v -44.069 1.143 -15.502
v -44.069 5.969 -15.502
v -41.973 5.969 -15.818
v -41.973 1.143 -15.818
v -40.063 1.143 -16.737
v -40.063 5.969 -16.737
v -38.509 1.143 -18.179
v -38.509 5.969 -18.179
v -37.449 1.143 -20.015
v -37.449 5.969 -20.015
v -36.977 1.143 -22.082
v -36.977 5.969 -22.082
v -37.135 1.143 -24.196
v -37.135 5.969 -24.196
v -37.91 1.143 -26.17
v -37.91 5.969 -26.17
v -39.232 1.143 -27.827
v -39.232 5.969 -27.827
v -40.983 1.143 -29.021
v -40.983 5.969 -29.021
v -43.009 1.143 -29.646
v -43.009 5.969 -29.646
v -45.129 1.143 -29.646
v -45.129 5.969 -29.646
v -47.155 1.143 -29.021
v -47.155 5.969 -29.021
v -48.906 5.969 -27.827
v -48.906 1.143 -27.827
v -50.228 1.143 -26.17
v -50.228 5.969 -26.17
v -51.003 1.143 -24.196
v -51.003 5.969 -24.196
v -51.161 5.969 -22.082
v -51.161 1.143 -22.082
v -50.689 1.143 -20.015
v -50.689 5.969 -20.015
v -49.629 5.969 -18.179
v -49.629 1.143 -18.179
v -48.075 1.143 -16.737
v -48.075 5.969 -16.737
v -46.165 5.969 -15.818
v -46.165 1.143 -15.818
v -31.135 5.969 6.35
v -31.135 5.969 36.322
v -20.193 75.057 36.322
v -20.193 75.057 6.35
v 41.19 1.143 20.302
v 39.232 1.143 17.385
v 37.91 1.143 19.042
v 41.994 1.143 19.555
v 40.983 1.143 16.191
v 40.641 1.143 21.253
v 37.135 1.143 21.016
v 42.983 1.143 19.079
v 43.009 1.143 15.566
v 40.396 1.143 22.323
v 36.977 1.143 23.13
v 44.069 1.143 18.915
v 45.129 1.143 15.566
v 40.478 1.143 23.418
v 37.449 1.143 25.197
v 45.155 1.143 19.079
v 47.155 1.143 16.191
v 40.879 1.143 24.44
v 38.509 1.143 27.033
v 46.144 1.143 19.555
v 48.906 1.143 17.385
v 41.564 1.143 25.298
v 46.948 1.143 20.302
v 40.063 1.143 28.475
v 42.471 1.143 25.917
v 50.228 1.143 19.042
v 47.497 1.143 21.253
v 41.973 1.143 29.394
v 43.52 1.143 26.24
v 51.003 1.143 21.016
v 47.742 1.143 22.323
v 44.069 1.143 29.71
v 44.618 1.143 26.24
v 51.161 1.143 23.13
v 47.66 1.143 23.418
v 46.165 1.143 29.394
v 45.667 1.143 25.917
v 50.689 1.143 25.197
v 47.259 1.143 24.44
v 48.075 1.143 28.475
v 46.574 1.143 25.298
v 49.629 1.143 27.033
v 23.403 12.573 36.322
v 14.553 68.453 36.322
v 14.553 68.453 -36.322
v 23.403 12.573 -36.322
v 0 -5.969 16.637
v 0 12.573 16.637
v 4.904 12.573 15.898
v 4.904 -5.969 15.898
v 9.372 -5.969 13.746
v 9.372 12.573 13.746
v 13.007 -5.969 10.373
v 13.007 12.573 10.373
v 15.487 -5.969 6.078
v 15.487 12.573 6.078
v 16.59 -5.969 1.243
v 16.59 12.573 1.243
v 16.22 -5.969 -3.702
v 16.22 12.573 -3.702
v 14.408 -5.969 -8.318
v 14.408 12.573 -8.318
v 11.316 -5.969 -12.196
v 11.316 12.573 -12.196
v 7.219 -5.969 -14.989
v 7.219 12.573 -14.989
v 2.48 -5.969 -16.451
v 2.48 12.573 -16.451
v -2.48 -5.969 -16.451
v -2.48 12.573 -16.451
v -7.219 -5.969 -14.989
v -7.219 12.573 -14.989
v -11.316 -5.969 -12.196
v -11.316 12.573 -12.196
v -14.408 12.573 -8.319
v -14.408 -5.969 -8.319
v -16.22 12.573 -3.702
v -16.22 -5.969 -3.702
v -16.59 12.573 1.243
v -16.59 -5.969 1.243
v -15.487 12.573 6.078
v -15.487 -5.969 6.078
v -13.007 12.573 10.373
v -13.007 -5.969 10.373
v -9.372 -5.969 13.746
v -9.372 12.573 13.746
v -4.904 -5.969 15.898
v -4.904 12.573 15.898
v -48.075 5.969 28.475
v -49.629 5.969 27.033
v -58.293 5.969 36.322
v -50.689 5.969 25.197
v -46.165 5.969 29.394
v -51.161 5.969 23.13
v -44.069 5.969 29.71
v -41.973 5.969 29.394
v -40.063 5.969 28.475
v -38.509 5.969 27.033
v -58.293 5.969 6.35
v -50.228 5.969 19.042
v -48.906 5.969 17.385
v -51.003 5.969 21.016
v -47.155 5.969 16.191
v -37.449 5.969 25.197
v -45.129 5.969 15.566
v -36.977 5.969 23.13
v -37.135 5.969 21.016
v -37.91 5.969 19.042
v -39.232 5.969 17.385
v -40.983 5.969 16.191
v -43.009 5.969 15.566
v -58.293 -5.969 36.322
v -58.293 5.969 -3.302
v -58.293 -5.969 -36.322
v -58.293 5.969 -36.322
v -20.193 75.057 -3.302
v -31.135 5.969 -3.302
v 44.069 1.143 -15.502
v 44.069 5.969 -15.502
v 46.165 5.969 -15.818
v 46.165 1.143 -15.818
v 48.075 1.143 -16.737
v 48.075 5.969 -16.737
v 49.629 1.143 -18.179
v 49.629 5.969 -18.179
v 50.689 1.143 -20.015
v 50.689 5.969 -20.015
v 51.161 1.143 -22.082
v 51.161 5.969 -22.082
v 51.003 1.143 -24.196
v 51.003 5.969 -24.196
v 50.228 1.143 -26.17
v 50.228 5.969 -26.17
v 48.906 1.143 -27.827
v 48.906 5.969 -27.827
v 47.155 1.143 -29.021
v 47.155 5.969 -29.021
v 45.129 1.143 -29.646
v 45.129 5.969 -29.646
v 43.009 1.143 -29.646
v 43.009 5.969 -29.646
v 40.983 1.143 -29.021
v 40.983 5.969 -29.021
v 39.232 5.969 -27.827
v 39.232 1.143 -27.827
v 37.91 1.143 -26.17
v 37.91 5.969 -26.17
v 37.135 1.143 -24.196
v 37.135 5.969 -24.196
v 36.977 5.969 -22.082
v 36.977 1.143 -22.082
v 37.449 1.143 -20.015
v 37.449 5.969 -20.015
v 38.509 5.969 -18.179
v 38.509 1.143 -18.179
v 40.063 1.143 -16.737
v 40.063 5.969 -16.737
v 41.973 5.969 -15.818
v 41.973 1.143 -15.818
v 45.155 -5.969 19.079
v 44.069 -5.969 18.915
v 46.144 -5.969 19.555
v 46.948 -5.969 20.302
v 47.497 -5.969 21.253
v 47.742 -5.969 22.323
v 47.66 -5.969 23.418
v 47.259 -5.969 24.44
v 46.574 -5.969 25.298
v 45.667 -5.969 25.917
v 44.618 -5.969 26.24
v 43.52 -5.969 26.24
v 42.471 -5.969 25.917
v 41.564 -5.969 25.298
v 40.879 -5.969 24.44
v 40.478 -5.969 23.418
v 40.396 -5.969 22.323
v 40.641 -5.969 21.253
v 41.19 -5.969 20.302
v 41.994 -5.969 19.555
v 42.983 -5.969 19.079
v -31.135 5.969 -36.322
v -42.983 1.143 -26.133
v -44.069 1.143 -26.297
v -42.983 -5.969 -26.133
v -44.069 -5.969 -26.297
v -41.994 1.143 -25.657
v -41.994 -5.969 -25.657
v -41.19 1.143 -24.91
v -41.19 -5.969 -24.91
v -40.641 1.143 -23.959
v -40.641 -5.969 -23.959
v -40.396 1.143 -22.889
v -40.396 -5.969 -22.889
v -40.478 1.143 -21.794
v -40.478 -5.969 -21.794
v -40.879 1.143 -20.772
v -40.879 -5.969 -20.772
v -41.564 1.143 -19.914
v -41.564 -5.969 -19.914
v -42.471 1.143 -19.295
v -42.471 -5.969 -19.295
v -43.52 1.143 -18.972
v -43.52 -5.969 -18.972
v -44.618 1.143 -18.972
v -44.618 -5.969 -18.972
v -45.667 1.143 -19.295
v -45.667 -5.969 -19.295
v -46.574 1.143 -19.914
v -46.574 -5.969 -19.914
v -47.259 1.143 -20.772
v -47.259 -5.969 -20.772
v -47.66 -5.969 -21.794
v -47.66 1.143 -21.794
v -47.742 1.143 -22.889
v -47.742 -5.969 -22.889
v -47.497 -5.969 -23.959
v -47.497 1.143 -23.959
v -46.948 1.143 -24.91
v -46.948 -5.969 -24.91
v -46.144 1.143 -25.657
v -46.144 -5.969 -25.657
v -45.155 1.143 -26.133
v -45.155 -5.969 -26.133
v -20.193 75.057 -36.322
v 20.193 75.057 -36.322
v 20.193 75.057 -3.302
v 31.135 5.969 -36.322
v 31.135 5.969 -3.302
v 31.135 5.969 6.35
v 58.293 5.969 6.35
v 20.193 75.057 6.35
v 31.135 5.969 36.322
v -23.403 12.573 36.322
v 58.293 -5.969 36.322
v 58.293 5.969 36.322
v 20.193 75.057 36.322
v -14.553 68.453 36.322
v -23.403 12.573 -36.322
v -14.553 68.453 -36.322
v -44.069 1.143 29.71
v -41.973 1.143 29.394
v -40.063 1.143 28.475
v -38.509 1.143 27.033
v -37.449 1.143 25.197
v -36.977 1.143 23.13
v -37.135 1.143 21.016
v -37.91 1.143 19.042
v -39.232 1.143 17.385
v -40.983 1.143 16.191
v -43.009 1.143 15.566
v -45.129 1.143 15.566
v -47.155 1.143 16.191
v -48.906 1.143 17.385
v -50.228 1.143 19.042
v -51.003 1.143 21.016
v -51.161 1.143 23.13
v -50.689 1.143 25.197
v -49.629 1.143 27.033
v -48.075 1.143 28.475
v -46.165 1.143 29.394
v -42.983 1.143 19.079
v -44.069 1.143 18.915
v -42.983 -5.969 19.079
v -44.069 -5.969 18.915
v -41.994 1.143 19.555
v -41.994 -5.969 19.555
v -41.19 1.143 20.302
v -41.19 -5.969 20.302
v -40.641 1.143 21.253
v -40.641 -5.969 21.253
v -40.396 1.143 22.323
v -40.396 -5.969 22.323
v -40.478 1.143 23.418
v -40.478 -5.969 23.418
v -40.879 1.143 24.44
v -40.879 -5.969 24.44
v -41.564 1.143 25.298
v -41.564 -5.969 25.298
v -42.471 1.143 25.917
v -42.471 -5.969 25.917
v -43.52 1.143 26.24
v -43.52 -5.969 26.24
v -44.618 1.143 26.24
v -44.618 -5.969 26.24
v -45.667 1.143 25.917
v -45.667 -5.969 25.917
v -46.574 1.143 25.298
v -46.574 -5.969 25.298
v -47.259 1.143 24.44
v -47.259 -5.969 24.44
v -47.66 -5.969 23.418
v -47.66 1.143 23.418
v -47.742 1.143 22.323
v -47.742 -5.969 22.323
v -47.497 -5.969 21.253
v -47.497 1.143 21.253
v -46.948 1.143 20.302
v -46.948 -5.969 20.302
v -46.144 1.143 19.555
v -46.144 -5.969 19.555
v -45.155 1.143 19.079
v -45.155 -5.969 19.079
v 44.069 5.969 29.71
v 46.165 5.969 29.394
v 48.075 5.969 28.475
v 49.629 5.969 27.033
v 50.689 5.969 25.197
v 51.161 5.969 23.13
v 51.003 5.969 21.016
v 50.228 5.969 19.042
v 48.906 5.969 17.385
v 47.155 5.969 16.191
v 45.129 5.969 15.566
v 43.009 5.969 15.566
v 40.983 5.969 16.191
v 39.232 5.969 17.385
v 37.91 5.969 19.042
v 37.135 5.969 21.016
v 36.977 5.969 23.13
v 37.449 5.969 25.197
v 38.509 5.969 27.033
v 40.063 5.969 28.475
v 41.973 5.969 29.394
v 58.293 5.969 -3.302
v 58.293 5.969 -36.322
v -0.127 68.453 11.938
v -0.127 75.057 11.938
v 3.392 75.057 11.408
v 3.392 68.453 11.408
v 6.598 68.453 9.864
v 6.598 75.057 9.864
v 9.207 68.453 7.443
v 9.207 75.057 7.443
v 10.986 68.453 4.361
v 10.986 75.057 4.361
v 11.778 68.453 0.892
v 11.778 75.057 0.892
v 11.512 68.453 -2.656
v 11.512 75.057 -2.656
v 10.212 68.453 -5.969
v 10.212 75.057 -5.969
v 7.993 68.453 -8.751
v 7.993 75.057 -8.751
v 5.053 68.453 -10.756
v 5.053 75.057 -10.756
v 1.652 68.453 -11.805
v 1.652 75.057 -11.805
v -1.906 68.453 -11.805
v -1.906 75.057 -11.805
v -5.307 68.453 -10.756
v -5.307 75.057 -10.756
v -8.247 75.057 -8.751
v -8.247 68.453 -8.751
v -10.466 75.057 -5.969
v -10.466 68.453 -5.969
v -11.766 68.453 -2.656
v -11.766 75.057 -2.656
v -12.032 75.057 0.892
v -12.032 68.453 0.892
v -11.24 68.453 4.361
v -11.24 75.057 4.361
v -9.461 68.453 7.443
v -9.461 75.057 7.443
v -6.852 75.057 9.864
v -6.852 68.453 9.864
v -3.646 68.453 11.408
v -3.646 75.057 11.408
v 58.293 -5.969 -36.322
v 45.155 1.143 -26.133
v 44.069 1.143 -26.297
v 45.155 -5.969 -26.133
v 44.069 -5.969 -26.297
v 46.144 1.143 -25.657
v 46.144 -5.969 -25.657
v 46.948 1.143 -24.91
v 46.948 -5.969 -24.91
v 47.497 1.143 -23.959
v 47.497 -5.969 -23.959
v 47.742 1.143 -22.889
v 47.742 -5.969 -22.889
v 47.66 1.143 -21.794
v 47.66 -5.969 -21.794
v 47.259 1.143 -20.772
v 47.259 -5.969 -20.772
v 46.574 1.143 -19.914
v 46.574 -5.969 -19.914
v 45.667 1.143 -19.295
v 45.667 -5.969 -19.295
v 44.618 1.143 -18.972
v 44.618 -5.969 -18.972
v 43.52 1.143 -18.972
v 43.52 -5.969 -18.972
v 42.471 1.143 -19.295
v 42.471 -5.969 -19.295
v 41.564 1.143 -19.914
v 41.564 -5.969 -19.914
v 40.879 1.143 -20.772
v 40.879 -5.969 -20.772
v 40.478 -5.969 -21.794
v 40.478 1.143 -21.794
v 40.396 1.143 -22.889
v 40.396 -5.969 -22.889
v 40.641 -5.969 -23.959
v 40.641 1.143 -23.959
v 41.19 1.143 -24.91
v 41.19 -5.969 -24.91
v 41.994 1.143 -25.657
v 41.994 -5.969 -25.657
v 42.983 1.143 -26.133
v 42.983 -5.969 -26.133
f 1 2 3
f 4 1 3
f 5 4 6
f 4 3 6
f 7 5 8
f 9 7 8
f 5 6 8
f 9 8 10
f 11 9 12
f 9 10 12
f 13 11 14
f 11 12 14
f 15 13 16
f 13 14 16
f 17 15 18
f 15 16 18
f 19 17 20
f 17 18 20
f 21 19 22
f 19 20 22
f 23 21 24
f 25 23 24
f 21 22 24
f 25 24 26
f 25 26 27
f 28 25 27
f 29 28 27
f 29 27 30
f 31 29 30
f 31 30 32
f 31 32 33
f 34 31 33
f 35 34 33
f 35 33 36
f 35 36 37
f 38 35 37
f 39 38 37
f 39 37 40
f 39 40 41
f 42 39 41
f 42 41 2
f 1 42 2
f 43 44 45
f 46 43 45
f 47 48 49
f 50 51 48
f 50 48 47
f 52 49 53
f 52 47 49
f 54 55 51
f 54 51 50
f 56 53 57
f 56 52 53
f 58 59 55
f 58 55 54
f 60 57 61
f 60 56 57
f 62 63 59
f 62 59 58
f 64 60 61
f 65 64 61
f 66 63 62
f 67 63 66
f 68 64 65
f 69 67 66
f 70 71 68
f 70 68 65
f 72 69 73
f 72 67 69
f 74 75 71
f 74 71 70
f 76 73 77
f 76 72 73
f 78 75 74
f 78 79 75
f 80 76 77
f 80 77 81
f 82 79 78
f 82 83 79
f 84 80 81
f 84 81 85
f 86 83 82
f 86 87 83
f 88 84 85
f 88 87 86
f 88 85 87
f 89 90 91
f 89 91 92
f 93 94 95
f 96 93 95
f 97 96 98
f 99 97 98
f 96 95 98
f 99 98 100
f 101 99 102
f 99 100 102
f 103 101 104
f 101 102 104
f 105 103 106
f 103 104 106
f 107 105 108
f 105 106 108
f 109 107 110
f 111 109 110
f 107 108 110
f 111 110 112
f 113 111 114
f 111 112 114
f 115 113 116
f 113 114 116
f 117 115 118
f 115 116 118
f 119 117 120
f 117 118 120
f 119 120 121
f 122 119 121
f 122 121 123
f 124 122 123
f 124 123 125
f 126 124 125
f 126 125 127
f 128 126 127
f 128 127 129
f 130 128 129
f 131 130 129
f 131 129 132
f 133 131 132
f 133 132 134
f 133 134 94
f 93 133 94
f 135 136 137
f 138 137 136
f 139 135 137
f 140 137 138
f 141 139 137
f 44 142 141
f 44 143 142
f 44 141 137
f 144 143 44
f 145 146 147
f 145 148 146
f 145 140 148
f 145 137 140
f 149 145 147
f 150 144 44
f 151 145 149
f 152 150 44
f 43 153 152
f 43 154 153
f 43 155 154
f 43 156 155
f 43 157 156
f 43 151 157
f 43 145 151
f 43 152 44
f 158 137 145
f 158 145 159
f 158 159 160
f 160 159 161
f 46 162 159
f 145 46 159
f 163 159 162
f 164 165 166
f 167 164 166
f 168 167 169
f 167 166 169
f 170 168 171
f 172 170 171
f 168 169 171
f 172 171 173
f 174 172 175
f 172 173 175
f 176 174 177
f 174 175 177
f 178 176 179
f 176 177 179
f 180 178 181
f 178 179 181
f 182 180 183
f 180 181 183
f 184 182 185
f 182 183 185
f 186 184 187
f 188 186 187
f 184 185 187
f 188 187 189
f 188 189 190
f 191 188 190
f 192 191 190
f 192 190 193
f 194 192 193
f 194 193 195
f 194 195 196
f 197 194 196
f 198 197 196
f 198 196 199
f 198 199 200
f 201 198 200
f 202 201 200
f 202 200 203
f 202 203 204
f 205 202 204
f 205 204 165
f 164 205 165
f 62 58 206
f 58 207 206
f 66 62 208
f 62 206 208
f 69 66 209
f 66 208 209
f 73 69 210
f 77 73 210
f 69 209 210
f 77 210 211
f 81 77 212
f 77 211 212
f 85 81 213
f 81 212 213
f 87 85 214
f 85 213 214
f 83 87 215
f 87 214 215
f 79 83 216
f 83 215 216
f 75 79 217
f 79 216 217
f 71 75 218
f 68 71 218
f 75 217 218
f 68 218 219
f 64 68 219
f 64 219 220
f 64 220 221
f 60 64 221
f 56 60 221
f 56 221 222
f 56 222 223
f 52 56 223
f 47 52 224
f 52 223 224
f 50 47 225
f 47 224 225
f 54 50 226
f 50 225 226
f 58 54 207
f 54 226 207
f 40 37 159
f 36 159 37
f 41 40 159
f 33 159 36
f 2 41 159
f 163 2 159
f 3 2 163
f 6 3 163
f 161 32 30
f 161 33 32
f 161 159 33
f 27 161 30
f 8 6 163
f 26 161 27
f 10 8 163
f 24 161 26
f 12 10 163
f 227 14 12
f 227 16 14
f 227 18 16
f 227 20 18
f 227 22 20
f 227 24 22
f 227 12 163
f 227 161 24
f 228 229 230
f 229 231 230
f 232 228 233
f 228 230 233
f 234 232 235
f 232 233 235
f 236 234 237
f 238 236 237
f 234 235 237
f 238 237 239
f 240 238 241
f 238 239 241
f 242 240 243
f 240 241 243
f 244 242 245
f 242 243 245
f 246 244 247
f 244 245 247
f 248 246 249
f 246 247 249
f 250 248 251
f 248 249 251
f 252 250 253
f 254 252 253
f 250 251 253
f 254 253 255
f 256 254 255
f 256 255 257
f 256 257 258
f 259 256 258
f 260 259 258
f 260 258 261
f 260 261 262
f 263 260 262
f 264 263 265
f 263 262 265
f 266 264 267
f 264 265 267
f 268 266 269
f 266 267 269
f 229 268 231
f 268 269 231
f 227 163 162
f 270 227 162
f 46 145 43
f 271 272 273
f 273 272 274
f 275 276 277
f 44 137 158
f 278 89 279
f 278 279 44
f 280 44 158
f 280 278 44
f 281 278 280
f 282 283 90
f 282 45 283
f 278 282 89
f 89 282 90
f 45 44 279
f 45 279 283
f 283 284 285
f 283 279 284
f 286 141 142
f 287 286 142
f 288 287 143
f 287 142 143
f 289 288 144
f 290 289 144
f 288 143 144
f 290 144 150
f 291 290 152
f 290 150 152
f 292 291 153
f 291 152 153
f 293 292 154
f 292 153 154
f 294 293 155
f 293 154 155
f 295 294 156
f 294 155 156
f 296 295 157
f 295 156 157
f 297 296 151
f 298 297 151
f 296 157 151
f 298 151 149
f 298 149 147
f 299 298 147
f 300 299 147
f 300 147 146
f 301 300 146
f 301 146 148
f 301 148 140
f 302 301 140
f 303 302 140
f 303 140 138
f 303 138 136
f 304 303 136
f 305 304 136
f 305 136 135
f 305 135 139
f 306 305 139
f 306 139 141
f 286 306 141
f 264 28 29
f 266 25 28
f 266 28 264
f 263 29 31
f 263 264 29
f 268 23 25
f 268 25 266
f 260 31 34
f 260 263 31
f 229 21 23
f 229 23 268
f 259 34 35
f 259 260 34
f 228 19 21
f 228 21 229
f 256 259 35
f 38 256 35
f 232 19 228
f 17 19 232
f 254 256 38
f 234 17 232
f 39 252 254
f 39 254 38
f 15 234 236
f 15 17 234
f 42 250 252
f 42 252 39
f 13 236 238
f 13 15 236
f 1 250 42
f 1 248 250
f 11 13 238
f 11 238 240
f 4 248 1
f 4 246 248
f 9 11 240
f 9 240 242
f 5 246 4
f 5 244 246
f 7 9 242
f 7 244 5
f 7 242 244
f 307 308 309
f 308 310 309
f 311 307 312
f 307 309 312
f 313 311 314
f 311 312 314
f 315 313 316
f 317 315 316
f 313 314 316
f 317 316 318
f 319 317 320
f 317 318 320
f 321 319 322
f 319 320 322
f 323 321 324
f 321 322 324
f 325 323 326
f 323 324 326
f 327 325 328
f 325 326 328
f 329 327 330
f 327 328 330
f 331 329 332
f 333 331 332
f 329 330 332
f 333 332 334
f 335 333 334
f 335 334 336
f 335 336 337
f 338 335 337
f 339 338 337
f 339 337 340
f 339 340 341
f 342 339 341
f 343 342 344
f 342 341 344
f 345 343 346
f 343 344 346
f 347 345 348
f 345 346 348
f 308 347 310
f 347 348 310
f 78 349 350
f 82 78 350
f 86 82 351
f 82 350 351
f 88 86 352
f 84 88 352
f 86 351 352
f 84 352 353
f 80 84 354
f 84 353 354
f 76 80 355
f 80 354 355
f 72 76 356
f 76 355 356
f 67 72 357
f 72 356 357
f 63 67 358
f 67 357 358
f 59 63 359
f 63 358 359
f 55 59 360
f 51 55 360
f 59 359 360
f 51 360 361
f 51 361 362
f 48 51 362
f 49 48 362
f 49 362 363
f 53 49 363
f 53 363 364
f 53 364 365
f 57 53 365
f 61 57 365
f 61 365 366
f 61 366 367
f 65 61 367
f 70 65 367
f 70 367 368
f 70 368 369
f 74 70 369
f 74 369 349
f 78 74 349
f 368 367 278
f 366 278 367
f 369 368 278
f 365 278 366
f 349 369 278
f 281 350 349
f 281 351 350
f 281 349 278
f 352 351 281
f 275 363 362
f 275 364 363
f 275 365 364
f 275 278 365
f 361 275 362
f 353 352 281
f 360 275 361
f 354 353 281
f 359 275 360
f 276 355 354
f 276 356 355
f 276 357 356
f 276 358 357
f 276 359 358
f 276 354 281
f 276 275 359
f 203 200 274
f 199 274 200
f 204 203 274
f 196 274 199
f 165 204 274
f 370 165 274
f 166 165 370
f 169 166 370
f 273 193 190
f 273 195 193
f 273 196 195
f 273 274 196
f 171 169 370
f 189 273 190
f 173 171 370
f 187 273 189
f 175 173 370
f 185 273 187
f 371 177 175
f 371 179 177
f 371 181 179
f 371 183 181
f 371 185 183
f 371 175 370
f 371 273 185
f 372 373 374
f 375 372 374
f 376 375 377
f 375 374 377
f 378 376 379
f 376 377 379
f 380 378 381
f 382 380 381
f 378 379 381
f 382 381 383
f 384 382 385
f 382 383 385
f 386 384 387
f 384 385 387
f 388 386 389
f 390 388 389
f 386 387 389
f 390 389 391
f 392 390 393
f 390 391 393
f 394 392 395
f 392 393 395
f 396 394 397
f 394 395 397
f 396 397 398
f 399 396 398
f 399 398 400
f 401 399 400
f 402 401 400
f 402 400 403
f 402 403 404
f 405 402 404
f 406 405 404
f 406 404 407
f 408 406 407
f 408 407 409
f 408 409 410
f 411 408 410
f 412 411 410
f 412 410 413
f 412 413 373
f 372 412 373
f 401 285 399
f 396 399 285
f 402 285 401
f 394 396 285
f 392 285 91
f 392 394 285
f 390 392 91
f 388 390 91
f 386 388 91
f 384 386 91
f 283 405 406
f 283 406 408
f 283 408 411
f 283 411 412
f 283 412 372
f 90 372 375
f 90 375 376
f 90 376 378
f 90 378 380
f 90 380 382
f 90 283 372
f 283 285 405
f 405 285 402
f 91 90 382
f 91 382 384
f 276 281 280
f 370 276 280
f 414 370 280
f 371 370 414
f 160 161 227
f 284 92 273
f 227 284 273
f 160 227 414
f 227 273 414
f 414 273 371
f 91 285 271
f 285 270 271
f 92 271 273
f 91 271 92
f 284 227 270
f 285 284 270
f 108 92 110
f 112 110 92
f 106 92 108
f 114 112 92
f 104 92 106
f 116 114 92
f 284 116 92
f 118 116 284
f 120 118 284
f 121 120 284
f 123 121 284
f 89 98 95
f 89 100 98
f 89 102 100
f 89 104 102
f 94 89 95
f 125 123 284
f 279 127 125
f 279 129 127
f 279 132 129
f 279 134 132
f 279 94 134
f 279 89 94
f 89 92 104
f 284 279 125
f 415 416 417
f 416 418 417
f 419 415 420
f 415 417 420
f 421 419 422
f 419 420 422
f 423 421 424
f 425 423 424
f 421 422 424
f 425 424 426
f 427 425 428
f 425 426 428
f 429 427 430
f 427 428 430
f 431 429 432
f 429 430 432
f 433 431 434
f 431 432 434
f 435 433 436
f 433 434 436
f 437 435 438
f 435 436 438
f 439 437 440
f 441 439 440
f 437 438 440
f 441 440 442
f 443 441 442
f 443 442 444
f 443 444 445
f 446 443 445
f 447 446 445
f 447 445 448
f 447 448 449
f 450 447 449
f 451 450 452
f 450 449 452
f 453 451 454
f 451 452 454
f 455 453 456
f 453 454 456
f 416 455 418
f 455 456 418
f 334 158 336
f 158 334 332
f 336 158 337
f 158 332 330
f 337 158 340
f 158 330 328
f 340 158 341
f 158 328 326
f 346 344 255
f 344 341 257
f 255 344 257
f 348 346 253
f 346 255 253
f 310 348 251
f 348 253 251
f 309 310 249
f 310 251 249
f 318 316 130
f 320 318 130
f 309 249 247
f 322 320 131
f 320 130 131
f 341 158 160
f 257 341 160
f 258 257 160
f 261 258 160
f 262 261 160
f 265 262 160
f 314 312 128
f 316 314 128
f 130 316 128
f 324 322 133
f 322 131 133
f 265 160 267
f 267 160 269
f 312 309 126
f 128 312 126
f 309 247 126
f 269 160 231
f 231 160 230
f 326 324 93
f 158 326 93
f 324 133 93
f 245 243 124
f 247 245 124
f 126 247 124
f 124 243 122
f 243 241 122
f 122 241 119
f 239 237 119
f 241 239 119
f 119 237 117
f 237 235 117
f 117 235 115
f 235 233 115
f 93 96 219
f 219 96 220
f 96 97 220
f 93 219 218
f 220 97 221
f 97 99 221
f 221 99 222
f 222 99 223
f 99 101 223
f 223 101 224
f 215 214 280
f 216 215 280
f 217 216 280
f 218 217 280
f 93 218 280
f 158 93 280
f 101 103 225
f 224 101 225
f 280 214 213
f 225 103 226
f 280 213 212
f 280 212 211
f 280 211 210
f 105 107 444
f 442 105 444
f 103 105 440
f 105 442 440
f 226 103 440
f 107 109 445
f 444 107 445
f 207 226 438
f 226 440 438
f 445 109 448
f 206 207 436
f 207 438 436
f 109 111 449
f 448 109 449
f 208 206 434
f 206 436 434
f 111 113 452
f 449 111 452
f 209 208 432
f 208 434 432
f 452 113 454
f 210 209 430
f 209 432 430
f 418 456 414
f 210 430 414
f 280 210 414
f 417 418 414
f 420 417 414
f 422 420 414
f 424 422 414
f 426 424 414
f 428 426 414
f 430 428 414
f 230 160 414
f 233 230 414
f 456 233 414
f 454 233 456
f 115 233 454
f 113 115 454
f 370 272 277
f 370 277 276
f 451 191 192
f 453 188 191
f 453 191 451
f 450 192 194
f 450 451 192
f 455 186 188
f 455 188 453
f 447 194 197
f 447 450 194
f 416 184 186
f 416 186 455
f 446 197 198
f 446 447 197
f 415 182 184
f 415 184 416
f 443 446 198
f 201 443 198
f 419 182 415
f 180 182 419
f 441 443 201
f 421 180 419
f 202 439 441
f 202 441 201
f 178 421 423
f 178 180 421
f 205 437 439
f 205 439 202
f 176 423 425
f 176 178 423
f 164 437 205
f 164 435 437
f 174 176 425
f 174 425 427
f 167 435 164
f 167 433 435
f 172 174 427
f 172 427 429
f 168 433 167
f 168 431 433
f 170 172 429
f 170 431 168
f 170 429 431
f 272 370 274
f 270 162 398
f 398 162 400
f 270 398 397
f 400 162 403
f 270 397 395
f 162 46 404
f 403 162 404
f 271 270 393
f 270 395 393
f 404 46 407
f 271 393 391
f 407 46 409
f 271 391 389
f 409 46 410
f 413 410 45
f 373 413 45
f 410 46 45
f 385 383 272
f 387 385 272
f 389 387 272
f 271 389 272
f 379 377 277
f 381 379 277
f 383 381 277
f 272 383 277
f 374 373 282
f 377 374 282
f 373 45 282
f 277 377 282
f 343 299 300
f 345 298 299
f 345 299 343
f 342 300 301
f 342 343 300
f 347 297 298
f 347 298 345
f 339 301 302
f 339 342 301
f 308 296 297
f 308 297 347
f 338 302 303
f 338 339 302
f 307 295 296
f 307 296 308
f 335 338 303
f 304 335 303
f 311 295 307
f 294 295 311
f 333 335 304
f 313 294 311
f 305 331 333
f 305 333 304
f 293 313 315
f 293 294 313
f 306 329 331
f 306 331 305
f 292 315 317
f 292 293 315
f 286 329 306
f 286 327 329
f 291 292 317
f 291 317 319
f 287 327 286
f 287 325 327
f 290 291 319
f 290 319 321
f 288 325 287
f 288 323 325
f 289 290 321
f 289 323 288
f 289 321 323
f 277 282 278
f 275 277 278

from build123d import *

# Parameters (mm, degrees)
SKETCH3_W                                           = 116.586
SKETCH3_H                                           = 72.644
BOSS_EXTRUDE1_DEPTH                                 = 5.969
BOSS_EXTRUDE2_DEPTH                                 = 36.322
BOSS_EXTRUDE3_DEPTH                                 = 9.652
CUT_EXTRUDE1_REACH                                  = 108.219
SKETCH6_R                                           = 11.938
CBORE_FOR_00_BINDING_HEAD_MACHINE_SCREW_D           = 7.366
CBORE_FOR_00_BINDING_HEAD_MACHINE_SCREW_CBORE_D     = 14.224
CBORE_FOR_00_BINDING_HEAD_MACHINE_SCREW_CBORE_DEPTH = 4.826
SKETCH9_R                                           = 16.637
CUT_EXTRUDE2_DEPTH                                  = 93.852634798


with BuildPart() as part:
    # Sketch3 → Boss-Extrude1 (new, symmetric)
    with BuildSketch(Plane(origin=(0, 0, 0), x_dir=(1, 0, 0), z_dir=(0, 1, 0))):
        Rectangle(SKETCH3_W, SKETCH3_H)
    extrude(amount=BOSS_EXTRUDE1_DEPTH, both=True)

    # Sketch4 → Boss-Extrude2 (add, symmetric)
    with BuildSketch(Plane.XY):
        Polygon((-31.135464213, 5.969), (-20.193, 75.057), (20.193, 75.057), (31.135464213, 5.969), align=None)
        Polygon((-23.403173679, 12.573), (-14.552651153, 68.453), (14.552651153, 68.453), (23.403173679, 12.573), align=None, mode=Mode.SUBTRACT)
    extrude(amount=BOSS_EXTRUDE2_DEPTH, both=True)

    # Sketch5 → Boss-Extrude3 (add)
    with BuildSketch(Plane(origin=(0, 0, -3.302), x_dir=(-1, 0, 0), z_dir=(0, 0, -1))):
        Polygon((-20.193, 75.057), (-58.293, 5.969), (-31.135464213, 5.969), align=None)
    boss_extrude3 = extrude(amount=-BOSS_EXTRUDE3_DEPTH)

    # Mirror1: Boss-Extrude3 across plane
    add(boss_extrude3.mirror(Plane(origin=(0, 0, 0), x_dir=(0, 0, 1), z_dir=(1, 0, 0))))

    # Sketch6 → Cut-Extrude1 (cut, up to next)
    with BuildSketch(Plane(origin=(0, 75.057, 0), x_dir=(1, 0, 0), z_dir=(0, 1, 0)), mode=Mode.PRIVATE) as cut_extrude1_sk1:
        with Locations(Location((-0.127, 0, 0), (0, 0, 270))):
            Circle(SKETCH6_R)
    cut_extrude1_tool1 = extrude(cut_extrude1_sk1.sketch, amount=-CUT_EXTRUDE1_REACH, mode=Mode.PRIVATE) & part.part
    add(cut_extrude1_tool1.solids().sort_by_distance((-0.127, 75.057, 0))[0], mode=Mode.SUBTRACT)

    # CBORE for #00 Binding Head Machine Screw1 (through all)
    with Locations(Plane(origin=(-44.069, 5.969, 22.5984117), x_dir=(0, 0, 1), z_dir=(0, 1, 0))):
        with Locations((0, 0), (0, 88.138), (-45.212, 88.138), (-45.212, 0)):
            CounterBoreHole(CBORE_FOR_00_BINDING_HEAD_MACHINE_SCREW_D / 2, CBORE_FOR_00_BINDING_HEAD_MACHINE_SCREW_CBORE_D / 2, CBORE_FOR_00_BINDING_HEAD_MACHINE_SCREW_CBORE_DEPTH)

    # Sketch9 → Cut-Extrude2 (cut, through all)
    with BuildSketch(Plane(origin=(0, 12.573, 0), x_dir=(1, 0, 0), z_dir=(0, 1, 0))):
        with Locations(Location((0, 0, 0), (0, 0, 270))):
            Circle(SKETCH9_R)
    extrude(amount=-CUT_EXTRUDE2_DEPTH, mode=Mode.SUBTRACT)


solid = part.part
